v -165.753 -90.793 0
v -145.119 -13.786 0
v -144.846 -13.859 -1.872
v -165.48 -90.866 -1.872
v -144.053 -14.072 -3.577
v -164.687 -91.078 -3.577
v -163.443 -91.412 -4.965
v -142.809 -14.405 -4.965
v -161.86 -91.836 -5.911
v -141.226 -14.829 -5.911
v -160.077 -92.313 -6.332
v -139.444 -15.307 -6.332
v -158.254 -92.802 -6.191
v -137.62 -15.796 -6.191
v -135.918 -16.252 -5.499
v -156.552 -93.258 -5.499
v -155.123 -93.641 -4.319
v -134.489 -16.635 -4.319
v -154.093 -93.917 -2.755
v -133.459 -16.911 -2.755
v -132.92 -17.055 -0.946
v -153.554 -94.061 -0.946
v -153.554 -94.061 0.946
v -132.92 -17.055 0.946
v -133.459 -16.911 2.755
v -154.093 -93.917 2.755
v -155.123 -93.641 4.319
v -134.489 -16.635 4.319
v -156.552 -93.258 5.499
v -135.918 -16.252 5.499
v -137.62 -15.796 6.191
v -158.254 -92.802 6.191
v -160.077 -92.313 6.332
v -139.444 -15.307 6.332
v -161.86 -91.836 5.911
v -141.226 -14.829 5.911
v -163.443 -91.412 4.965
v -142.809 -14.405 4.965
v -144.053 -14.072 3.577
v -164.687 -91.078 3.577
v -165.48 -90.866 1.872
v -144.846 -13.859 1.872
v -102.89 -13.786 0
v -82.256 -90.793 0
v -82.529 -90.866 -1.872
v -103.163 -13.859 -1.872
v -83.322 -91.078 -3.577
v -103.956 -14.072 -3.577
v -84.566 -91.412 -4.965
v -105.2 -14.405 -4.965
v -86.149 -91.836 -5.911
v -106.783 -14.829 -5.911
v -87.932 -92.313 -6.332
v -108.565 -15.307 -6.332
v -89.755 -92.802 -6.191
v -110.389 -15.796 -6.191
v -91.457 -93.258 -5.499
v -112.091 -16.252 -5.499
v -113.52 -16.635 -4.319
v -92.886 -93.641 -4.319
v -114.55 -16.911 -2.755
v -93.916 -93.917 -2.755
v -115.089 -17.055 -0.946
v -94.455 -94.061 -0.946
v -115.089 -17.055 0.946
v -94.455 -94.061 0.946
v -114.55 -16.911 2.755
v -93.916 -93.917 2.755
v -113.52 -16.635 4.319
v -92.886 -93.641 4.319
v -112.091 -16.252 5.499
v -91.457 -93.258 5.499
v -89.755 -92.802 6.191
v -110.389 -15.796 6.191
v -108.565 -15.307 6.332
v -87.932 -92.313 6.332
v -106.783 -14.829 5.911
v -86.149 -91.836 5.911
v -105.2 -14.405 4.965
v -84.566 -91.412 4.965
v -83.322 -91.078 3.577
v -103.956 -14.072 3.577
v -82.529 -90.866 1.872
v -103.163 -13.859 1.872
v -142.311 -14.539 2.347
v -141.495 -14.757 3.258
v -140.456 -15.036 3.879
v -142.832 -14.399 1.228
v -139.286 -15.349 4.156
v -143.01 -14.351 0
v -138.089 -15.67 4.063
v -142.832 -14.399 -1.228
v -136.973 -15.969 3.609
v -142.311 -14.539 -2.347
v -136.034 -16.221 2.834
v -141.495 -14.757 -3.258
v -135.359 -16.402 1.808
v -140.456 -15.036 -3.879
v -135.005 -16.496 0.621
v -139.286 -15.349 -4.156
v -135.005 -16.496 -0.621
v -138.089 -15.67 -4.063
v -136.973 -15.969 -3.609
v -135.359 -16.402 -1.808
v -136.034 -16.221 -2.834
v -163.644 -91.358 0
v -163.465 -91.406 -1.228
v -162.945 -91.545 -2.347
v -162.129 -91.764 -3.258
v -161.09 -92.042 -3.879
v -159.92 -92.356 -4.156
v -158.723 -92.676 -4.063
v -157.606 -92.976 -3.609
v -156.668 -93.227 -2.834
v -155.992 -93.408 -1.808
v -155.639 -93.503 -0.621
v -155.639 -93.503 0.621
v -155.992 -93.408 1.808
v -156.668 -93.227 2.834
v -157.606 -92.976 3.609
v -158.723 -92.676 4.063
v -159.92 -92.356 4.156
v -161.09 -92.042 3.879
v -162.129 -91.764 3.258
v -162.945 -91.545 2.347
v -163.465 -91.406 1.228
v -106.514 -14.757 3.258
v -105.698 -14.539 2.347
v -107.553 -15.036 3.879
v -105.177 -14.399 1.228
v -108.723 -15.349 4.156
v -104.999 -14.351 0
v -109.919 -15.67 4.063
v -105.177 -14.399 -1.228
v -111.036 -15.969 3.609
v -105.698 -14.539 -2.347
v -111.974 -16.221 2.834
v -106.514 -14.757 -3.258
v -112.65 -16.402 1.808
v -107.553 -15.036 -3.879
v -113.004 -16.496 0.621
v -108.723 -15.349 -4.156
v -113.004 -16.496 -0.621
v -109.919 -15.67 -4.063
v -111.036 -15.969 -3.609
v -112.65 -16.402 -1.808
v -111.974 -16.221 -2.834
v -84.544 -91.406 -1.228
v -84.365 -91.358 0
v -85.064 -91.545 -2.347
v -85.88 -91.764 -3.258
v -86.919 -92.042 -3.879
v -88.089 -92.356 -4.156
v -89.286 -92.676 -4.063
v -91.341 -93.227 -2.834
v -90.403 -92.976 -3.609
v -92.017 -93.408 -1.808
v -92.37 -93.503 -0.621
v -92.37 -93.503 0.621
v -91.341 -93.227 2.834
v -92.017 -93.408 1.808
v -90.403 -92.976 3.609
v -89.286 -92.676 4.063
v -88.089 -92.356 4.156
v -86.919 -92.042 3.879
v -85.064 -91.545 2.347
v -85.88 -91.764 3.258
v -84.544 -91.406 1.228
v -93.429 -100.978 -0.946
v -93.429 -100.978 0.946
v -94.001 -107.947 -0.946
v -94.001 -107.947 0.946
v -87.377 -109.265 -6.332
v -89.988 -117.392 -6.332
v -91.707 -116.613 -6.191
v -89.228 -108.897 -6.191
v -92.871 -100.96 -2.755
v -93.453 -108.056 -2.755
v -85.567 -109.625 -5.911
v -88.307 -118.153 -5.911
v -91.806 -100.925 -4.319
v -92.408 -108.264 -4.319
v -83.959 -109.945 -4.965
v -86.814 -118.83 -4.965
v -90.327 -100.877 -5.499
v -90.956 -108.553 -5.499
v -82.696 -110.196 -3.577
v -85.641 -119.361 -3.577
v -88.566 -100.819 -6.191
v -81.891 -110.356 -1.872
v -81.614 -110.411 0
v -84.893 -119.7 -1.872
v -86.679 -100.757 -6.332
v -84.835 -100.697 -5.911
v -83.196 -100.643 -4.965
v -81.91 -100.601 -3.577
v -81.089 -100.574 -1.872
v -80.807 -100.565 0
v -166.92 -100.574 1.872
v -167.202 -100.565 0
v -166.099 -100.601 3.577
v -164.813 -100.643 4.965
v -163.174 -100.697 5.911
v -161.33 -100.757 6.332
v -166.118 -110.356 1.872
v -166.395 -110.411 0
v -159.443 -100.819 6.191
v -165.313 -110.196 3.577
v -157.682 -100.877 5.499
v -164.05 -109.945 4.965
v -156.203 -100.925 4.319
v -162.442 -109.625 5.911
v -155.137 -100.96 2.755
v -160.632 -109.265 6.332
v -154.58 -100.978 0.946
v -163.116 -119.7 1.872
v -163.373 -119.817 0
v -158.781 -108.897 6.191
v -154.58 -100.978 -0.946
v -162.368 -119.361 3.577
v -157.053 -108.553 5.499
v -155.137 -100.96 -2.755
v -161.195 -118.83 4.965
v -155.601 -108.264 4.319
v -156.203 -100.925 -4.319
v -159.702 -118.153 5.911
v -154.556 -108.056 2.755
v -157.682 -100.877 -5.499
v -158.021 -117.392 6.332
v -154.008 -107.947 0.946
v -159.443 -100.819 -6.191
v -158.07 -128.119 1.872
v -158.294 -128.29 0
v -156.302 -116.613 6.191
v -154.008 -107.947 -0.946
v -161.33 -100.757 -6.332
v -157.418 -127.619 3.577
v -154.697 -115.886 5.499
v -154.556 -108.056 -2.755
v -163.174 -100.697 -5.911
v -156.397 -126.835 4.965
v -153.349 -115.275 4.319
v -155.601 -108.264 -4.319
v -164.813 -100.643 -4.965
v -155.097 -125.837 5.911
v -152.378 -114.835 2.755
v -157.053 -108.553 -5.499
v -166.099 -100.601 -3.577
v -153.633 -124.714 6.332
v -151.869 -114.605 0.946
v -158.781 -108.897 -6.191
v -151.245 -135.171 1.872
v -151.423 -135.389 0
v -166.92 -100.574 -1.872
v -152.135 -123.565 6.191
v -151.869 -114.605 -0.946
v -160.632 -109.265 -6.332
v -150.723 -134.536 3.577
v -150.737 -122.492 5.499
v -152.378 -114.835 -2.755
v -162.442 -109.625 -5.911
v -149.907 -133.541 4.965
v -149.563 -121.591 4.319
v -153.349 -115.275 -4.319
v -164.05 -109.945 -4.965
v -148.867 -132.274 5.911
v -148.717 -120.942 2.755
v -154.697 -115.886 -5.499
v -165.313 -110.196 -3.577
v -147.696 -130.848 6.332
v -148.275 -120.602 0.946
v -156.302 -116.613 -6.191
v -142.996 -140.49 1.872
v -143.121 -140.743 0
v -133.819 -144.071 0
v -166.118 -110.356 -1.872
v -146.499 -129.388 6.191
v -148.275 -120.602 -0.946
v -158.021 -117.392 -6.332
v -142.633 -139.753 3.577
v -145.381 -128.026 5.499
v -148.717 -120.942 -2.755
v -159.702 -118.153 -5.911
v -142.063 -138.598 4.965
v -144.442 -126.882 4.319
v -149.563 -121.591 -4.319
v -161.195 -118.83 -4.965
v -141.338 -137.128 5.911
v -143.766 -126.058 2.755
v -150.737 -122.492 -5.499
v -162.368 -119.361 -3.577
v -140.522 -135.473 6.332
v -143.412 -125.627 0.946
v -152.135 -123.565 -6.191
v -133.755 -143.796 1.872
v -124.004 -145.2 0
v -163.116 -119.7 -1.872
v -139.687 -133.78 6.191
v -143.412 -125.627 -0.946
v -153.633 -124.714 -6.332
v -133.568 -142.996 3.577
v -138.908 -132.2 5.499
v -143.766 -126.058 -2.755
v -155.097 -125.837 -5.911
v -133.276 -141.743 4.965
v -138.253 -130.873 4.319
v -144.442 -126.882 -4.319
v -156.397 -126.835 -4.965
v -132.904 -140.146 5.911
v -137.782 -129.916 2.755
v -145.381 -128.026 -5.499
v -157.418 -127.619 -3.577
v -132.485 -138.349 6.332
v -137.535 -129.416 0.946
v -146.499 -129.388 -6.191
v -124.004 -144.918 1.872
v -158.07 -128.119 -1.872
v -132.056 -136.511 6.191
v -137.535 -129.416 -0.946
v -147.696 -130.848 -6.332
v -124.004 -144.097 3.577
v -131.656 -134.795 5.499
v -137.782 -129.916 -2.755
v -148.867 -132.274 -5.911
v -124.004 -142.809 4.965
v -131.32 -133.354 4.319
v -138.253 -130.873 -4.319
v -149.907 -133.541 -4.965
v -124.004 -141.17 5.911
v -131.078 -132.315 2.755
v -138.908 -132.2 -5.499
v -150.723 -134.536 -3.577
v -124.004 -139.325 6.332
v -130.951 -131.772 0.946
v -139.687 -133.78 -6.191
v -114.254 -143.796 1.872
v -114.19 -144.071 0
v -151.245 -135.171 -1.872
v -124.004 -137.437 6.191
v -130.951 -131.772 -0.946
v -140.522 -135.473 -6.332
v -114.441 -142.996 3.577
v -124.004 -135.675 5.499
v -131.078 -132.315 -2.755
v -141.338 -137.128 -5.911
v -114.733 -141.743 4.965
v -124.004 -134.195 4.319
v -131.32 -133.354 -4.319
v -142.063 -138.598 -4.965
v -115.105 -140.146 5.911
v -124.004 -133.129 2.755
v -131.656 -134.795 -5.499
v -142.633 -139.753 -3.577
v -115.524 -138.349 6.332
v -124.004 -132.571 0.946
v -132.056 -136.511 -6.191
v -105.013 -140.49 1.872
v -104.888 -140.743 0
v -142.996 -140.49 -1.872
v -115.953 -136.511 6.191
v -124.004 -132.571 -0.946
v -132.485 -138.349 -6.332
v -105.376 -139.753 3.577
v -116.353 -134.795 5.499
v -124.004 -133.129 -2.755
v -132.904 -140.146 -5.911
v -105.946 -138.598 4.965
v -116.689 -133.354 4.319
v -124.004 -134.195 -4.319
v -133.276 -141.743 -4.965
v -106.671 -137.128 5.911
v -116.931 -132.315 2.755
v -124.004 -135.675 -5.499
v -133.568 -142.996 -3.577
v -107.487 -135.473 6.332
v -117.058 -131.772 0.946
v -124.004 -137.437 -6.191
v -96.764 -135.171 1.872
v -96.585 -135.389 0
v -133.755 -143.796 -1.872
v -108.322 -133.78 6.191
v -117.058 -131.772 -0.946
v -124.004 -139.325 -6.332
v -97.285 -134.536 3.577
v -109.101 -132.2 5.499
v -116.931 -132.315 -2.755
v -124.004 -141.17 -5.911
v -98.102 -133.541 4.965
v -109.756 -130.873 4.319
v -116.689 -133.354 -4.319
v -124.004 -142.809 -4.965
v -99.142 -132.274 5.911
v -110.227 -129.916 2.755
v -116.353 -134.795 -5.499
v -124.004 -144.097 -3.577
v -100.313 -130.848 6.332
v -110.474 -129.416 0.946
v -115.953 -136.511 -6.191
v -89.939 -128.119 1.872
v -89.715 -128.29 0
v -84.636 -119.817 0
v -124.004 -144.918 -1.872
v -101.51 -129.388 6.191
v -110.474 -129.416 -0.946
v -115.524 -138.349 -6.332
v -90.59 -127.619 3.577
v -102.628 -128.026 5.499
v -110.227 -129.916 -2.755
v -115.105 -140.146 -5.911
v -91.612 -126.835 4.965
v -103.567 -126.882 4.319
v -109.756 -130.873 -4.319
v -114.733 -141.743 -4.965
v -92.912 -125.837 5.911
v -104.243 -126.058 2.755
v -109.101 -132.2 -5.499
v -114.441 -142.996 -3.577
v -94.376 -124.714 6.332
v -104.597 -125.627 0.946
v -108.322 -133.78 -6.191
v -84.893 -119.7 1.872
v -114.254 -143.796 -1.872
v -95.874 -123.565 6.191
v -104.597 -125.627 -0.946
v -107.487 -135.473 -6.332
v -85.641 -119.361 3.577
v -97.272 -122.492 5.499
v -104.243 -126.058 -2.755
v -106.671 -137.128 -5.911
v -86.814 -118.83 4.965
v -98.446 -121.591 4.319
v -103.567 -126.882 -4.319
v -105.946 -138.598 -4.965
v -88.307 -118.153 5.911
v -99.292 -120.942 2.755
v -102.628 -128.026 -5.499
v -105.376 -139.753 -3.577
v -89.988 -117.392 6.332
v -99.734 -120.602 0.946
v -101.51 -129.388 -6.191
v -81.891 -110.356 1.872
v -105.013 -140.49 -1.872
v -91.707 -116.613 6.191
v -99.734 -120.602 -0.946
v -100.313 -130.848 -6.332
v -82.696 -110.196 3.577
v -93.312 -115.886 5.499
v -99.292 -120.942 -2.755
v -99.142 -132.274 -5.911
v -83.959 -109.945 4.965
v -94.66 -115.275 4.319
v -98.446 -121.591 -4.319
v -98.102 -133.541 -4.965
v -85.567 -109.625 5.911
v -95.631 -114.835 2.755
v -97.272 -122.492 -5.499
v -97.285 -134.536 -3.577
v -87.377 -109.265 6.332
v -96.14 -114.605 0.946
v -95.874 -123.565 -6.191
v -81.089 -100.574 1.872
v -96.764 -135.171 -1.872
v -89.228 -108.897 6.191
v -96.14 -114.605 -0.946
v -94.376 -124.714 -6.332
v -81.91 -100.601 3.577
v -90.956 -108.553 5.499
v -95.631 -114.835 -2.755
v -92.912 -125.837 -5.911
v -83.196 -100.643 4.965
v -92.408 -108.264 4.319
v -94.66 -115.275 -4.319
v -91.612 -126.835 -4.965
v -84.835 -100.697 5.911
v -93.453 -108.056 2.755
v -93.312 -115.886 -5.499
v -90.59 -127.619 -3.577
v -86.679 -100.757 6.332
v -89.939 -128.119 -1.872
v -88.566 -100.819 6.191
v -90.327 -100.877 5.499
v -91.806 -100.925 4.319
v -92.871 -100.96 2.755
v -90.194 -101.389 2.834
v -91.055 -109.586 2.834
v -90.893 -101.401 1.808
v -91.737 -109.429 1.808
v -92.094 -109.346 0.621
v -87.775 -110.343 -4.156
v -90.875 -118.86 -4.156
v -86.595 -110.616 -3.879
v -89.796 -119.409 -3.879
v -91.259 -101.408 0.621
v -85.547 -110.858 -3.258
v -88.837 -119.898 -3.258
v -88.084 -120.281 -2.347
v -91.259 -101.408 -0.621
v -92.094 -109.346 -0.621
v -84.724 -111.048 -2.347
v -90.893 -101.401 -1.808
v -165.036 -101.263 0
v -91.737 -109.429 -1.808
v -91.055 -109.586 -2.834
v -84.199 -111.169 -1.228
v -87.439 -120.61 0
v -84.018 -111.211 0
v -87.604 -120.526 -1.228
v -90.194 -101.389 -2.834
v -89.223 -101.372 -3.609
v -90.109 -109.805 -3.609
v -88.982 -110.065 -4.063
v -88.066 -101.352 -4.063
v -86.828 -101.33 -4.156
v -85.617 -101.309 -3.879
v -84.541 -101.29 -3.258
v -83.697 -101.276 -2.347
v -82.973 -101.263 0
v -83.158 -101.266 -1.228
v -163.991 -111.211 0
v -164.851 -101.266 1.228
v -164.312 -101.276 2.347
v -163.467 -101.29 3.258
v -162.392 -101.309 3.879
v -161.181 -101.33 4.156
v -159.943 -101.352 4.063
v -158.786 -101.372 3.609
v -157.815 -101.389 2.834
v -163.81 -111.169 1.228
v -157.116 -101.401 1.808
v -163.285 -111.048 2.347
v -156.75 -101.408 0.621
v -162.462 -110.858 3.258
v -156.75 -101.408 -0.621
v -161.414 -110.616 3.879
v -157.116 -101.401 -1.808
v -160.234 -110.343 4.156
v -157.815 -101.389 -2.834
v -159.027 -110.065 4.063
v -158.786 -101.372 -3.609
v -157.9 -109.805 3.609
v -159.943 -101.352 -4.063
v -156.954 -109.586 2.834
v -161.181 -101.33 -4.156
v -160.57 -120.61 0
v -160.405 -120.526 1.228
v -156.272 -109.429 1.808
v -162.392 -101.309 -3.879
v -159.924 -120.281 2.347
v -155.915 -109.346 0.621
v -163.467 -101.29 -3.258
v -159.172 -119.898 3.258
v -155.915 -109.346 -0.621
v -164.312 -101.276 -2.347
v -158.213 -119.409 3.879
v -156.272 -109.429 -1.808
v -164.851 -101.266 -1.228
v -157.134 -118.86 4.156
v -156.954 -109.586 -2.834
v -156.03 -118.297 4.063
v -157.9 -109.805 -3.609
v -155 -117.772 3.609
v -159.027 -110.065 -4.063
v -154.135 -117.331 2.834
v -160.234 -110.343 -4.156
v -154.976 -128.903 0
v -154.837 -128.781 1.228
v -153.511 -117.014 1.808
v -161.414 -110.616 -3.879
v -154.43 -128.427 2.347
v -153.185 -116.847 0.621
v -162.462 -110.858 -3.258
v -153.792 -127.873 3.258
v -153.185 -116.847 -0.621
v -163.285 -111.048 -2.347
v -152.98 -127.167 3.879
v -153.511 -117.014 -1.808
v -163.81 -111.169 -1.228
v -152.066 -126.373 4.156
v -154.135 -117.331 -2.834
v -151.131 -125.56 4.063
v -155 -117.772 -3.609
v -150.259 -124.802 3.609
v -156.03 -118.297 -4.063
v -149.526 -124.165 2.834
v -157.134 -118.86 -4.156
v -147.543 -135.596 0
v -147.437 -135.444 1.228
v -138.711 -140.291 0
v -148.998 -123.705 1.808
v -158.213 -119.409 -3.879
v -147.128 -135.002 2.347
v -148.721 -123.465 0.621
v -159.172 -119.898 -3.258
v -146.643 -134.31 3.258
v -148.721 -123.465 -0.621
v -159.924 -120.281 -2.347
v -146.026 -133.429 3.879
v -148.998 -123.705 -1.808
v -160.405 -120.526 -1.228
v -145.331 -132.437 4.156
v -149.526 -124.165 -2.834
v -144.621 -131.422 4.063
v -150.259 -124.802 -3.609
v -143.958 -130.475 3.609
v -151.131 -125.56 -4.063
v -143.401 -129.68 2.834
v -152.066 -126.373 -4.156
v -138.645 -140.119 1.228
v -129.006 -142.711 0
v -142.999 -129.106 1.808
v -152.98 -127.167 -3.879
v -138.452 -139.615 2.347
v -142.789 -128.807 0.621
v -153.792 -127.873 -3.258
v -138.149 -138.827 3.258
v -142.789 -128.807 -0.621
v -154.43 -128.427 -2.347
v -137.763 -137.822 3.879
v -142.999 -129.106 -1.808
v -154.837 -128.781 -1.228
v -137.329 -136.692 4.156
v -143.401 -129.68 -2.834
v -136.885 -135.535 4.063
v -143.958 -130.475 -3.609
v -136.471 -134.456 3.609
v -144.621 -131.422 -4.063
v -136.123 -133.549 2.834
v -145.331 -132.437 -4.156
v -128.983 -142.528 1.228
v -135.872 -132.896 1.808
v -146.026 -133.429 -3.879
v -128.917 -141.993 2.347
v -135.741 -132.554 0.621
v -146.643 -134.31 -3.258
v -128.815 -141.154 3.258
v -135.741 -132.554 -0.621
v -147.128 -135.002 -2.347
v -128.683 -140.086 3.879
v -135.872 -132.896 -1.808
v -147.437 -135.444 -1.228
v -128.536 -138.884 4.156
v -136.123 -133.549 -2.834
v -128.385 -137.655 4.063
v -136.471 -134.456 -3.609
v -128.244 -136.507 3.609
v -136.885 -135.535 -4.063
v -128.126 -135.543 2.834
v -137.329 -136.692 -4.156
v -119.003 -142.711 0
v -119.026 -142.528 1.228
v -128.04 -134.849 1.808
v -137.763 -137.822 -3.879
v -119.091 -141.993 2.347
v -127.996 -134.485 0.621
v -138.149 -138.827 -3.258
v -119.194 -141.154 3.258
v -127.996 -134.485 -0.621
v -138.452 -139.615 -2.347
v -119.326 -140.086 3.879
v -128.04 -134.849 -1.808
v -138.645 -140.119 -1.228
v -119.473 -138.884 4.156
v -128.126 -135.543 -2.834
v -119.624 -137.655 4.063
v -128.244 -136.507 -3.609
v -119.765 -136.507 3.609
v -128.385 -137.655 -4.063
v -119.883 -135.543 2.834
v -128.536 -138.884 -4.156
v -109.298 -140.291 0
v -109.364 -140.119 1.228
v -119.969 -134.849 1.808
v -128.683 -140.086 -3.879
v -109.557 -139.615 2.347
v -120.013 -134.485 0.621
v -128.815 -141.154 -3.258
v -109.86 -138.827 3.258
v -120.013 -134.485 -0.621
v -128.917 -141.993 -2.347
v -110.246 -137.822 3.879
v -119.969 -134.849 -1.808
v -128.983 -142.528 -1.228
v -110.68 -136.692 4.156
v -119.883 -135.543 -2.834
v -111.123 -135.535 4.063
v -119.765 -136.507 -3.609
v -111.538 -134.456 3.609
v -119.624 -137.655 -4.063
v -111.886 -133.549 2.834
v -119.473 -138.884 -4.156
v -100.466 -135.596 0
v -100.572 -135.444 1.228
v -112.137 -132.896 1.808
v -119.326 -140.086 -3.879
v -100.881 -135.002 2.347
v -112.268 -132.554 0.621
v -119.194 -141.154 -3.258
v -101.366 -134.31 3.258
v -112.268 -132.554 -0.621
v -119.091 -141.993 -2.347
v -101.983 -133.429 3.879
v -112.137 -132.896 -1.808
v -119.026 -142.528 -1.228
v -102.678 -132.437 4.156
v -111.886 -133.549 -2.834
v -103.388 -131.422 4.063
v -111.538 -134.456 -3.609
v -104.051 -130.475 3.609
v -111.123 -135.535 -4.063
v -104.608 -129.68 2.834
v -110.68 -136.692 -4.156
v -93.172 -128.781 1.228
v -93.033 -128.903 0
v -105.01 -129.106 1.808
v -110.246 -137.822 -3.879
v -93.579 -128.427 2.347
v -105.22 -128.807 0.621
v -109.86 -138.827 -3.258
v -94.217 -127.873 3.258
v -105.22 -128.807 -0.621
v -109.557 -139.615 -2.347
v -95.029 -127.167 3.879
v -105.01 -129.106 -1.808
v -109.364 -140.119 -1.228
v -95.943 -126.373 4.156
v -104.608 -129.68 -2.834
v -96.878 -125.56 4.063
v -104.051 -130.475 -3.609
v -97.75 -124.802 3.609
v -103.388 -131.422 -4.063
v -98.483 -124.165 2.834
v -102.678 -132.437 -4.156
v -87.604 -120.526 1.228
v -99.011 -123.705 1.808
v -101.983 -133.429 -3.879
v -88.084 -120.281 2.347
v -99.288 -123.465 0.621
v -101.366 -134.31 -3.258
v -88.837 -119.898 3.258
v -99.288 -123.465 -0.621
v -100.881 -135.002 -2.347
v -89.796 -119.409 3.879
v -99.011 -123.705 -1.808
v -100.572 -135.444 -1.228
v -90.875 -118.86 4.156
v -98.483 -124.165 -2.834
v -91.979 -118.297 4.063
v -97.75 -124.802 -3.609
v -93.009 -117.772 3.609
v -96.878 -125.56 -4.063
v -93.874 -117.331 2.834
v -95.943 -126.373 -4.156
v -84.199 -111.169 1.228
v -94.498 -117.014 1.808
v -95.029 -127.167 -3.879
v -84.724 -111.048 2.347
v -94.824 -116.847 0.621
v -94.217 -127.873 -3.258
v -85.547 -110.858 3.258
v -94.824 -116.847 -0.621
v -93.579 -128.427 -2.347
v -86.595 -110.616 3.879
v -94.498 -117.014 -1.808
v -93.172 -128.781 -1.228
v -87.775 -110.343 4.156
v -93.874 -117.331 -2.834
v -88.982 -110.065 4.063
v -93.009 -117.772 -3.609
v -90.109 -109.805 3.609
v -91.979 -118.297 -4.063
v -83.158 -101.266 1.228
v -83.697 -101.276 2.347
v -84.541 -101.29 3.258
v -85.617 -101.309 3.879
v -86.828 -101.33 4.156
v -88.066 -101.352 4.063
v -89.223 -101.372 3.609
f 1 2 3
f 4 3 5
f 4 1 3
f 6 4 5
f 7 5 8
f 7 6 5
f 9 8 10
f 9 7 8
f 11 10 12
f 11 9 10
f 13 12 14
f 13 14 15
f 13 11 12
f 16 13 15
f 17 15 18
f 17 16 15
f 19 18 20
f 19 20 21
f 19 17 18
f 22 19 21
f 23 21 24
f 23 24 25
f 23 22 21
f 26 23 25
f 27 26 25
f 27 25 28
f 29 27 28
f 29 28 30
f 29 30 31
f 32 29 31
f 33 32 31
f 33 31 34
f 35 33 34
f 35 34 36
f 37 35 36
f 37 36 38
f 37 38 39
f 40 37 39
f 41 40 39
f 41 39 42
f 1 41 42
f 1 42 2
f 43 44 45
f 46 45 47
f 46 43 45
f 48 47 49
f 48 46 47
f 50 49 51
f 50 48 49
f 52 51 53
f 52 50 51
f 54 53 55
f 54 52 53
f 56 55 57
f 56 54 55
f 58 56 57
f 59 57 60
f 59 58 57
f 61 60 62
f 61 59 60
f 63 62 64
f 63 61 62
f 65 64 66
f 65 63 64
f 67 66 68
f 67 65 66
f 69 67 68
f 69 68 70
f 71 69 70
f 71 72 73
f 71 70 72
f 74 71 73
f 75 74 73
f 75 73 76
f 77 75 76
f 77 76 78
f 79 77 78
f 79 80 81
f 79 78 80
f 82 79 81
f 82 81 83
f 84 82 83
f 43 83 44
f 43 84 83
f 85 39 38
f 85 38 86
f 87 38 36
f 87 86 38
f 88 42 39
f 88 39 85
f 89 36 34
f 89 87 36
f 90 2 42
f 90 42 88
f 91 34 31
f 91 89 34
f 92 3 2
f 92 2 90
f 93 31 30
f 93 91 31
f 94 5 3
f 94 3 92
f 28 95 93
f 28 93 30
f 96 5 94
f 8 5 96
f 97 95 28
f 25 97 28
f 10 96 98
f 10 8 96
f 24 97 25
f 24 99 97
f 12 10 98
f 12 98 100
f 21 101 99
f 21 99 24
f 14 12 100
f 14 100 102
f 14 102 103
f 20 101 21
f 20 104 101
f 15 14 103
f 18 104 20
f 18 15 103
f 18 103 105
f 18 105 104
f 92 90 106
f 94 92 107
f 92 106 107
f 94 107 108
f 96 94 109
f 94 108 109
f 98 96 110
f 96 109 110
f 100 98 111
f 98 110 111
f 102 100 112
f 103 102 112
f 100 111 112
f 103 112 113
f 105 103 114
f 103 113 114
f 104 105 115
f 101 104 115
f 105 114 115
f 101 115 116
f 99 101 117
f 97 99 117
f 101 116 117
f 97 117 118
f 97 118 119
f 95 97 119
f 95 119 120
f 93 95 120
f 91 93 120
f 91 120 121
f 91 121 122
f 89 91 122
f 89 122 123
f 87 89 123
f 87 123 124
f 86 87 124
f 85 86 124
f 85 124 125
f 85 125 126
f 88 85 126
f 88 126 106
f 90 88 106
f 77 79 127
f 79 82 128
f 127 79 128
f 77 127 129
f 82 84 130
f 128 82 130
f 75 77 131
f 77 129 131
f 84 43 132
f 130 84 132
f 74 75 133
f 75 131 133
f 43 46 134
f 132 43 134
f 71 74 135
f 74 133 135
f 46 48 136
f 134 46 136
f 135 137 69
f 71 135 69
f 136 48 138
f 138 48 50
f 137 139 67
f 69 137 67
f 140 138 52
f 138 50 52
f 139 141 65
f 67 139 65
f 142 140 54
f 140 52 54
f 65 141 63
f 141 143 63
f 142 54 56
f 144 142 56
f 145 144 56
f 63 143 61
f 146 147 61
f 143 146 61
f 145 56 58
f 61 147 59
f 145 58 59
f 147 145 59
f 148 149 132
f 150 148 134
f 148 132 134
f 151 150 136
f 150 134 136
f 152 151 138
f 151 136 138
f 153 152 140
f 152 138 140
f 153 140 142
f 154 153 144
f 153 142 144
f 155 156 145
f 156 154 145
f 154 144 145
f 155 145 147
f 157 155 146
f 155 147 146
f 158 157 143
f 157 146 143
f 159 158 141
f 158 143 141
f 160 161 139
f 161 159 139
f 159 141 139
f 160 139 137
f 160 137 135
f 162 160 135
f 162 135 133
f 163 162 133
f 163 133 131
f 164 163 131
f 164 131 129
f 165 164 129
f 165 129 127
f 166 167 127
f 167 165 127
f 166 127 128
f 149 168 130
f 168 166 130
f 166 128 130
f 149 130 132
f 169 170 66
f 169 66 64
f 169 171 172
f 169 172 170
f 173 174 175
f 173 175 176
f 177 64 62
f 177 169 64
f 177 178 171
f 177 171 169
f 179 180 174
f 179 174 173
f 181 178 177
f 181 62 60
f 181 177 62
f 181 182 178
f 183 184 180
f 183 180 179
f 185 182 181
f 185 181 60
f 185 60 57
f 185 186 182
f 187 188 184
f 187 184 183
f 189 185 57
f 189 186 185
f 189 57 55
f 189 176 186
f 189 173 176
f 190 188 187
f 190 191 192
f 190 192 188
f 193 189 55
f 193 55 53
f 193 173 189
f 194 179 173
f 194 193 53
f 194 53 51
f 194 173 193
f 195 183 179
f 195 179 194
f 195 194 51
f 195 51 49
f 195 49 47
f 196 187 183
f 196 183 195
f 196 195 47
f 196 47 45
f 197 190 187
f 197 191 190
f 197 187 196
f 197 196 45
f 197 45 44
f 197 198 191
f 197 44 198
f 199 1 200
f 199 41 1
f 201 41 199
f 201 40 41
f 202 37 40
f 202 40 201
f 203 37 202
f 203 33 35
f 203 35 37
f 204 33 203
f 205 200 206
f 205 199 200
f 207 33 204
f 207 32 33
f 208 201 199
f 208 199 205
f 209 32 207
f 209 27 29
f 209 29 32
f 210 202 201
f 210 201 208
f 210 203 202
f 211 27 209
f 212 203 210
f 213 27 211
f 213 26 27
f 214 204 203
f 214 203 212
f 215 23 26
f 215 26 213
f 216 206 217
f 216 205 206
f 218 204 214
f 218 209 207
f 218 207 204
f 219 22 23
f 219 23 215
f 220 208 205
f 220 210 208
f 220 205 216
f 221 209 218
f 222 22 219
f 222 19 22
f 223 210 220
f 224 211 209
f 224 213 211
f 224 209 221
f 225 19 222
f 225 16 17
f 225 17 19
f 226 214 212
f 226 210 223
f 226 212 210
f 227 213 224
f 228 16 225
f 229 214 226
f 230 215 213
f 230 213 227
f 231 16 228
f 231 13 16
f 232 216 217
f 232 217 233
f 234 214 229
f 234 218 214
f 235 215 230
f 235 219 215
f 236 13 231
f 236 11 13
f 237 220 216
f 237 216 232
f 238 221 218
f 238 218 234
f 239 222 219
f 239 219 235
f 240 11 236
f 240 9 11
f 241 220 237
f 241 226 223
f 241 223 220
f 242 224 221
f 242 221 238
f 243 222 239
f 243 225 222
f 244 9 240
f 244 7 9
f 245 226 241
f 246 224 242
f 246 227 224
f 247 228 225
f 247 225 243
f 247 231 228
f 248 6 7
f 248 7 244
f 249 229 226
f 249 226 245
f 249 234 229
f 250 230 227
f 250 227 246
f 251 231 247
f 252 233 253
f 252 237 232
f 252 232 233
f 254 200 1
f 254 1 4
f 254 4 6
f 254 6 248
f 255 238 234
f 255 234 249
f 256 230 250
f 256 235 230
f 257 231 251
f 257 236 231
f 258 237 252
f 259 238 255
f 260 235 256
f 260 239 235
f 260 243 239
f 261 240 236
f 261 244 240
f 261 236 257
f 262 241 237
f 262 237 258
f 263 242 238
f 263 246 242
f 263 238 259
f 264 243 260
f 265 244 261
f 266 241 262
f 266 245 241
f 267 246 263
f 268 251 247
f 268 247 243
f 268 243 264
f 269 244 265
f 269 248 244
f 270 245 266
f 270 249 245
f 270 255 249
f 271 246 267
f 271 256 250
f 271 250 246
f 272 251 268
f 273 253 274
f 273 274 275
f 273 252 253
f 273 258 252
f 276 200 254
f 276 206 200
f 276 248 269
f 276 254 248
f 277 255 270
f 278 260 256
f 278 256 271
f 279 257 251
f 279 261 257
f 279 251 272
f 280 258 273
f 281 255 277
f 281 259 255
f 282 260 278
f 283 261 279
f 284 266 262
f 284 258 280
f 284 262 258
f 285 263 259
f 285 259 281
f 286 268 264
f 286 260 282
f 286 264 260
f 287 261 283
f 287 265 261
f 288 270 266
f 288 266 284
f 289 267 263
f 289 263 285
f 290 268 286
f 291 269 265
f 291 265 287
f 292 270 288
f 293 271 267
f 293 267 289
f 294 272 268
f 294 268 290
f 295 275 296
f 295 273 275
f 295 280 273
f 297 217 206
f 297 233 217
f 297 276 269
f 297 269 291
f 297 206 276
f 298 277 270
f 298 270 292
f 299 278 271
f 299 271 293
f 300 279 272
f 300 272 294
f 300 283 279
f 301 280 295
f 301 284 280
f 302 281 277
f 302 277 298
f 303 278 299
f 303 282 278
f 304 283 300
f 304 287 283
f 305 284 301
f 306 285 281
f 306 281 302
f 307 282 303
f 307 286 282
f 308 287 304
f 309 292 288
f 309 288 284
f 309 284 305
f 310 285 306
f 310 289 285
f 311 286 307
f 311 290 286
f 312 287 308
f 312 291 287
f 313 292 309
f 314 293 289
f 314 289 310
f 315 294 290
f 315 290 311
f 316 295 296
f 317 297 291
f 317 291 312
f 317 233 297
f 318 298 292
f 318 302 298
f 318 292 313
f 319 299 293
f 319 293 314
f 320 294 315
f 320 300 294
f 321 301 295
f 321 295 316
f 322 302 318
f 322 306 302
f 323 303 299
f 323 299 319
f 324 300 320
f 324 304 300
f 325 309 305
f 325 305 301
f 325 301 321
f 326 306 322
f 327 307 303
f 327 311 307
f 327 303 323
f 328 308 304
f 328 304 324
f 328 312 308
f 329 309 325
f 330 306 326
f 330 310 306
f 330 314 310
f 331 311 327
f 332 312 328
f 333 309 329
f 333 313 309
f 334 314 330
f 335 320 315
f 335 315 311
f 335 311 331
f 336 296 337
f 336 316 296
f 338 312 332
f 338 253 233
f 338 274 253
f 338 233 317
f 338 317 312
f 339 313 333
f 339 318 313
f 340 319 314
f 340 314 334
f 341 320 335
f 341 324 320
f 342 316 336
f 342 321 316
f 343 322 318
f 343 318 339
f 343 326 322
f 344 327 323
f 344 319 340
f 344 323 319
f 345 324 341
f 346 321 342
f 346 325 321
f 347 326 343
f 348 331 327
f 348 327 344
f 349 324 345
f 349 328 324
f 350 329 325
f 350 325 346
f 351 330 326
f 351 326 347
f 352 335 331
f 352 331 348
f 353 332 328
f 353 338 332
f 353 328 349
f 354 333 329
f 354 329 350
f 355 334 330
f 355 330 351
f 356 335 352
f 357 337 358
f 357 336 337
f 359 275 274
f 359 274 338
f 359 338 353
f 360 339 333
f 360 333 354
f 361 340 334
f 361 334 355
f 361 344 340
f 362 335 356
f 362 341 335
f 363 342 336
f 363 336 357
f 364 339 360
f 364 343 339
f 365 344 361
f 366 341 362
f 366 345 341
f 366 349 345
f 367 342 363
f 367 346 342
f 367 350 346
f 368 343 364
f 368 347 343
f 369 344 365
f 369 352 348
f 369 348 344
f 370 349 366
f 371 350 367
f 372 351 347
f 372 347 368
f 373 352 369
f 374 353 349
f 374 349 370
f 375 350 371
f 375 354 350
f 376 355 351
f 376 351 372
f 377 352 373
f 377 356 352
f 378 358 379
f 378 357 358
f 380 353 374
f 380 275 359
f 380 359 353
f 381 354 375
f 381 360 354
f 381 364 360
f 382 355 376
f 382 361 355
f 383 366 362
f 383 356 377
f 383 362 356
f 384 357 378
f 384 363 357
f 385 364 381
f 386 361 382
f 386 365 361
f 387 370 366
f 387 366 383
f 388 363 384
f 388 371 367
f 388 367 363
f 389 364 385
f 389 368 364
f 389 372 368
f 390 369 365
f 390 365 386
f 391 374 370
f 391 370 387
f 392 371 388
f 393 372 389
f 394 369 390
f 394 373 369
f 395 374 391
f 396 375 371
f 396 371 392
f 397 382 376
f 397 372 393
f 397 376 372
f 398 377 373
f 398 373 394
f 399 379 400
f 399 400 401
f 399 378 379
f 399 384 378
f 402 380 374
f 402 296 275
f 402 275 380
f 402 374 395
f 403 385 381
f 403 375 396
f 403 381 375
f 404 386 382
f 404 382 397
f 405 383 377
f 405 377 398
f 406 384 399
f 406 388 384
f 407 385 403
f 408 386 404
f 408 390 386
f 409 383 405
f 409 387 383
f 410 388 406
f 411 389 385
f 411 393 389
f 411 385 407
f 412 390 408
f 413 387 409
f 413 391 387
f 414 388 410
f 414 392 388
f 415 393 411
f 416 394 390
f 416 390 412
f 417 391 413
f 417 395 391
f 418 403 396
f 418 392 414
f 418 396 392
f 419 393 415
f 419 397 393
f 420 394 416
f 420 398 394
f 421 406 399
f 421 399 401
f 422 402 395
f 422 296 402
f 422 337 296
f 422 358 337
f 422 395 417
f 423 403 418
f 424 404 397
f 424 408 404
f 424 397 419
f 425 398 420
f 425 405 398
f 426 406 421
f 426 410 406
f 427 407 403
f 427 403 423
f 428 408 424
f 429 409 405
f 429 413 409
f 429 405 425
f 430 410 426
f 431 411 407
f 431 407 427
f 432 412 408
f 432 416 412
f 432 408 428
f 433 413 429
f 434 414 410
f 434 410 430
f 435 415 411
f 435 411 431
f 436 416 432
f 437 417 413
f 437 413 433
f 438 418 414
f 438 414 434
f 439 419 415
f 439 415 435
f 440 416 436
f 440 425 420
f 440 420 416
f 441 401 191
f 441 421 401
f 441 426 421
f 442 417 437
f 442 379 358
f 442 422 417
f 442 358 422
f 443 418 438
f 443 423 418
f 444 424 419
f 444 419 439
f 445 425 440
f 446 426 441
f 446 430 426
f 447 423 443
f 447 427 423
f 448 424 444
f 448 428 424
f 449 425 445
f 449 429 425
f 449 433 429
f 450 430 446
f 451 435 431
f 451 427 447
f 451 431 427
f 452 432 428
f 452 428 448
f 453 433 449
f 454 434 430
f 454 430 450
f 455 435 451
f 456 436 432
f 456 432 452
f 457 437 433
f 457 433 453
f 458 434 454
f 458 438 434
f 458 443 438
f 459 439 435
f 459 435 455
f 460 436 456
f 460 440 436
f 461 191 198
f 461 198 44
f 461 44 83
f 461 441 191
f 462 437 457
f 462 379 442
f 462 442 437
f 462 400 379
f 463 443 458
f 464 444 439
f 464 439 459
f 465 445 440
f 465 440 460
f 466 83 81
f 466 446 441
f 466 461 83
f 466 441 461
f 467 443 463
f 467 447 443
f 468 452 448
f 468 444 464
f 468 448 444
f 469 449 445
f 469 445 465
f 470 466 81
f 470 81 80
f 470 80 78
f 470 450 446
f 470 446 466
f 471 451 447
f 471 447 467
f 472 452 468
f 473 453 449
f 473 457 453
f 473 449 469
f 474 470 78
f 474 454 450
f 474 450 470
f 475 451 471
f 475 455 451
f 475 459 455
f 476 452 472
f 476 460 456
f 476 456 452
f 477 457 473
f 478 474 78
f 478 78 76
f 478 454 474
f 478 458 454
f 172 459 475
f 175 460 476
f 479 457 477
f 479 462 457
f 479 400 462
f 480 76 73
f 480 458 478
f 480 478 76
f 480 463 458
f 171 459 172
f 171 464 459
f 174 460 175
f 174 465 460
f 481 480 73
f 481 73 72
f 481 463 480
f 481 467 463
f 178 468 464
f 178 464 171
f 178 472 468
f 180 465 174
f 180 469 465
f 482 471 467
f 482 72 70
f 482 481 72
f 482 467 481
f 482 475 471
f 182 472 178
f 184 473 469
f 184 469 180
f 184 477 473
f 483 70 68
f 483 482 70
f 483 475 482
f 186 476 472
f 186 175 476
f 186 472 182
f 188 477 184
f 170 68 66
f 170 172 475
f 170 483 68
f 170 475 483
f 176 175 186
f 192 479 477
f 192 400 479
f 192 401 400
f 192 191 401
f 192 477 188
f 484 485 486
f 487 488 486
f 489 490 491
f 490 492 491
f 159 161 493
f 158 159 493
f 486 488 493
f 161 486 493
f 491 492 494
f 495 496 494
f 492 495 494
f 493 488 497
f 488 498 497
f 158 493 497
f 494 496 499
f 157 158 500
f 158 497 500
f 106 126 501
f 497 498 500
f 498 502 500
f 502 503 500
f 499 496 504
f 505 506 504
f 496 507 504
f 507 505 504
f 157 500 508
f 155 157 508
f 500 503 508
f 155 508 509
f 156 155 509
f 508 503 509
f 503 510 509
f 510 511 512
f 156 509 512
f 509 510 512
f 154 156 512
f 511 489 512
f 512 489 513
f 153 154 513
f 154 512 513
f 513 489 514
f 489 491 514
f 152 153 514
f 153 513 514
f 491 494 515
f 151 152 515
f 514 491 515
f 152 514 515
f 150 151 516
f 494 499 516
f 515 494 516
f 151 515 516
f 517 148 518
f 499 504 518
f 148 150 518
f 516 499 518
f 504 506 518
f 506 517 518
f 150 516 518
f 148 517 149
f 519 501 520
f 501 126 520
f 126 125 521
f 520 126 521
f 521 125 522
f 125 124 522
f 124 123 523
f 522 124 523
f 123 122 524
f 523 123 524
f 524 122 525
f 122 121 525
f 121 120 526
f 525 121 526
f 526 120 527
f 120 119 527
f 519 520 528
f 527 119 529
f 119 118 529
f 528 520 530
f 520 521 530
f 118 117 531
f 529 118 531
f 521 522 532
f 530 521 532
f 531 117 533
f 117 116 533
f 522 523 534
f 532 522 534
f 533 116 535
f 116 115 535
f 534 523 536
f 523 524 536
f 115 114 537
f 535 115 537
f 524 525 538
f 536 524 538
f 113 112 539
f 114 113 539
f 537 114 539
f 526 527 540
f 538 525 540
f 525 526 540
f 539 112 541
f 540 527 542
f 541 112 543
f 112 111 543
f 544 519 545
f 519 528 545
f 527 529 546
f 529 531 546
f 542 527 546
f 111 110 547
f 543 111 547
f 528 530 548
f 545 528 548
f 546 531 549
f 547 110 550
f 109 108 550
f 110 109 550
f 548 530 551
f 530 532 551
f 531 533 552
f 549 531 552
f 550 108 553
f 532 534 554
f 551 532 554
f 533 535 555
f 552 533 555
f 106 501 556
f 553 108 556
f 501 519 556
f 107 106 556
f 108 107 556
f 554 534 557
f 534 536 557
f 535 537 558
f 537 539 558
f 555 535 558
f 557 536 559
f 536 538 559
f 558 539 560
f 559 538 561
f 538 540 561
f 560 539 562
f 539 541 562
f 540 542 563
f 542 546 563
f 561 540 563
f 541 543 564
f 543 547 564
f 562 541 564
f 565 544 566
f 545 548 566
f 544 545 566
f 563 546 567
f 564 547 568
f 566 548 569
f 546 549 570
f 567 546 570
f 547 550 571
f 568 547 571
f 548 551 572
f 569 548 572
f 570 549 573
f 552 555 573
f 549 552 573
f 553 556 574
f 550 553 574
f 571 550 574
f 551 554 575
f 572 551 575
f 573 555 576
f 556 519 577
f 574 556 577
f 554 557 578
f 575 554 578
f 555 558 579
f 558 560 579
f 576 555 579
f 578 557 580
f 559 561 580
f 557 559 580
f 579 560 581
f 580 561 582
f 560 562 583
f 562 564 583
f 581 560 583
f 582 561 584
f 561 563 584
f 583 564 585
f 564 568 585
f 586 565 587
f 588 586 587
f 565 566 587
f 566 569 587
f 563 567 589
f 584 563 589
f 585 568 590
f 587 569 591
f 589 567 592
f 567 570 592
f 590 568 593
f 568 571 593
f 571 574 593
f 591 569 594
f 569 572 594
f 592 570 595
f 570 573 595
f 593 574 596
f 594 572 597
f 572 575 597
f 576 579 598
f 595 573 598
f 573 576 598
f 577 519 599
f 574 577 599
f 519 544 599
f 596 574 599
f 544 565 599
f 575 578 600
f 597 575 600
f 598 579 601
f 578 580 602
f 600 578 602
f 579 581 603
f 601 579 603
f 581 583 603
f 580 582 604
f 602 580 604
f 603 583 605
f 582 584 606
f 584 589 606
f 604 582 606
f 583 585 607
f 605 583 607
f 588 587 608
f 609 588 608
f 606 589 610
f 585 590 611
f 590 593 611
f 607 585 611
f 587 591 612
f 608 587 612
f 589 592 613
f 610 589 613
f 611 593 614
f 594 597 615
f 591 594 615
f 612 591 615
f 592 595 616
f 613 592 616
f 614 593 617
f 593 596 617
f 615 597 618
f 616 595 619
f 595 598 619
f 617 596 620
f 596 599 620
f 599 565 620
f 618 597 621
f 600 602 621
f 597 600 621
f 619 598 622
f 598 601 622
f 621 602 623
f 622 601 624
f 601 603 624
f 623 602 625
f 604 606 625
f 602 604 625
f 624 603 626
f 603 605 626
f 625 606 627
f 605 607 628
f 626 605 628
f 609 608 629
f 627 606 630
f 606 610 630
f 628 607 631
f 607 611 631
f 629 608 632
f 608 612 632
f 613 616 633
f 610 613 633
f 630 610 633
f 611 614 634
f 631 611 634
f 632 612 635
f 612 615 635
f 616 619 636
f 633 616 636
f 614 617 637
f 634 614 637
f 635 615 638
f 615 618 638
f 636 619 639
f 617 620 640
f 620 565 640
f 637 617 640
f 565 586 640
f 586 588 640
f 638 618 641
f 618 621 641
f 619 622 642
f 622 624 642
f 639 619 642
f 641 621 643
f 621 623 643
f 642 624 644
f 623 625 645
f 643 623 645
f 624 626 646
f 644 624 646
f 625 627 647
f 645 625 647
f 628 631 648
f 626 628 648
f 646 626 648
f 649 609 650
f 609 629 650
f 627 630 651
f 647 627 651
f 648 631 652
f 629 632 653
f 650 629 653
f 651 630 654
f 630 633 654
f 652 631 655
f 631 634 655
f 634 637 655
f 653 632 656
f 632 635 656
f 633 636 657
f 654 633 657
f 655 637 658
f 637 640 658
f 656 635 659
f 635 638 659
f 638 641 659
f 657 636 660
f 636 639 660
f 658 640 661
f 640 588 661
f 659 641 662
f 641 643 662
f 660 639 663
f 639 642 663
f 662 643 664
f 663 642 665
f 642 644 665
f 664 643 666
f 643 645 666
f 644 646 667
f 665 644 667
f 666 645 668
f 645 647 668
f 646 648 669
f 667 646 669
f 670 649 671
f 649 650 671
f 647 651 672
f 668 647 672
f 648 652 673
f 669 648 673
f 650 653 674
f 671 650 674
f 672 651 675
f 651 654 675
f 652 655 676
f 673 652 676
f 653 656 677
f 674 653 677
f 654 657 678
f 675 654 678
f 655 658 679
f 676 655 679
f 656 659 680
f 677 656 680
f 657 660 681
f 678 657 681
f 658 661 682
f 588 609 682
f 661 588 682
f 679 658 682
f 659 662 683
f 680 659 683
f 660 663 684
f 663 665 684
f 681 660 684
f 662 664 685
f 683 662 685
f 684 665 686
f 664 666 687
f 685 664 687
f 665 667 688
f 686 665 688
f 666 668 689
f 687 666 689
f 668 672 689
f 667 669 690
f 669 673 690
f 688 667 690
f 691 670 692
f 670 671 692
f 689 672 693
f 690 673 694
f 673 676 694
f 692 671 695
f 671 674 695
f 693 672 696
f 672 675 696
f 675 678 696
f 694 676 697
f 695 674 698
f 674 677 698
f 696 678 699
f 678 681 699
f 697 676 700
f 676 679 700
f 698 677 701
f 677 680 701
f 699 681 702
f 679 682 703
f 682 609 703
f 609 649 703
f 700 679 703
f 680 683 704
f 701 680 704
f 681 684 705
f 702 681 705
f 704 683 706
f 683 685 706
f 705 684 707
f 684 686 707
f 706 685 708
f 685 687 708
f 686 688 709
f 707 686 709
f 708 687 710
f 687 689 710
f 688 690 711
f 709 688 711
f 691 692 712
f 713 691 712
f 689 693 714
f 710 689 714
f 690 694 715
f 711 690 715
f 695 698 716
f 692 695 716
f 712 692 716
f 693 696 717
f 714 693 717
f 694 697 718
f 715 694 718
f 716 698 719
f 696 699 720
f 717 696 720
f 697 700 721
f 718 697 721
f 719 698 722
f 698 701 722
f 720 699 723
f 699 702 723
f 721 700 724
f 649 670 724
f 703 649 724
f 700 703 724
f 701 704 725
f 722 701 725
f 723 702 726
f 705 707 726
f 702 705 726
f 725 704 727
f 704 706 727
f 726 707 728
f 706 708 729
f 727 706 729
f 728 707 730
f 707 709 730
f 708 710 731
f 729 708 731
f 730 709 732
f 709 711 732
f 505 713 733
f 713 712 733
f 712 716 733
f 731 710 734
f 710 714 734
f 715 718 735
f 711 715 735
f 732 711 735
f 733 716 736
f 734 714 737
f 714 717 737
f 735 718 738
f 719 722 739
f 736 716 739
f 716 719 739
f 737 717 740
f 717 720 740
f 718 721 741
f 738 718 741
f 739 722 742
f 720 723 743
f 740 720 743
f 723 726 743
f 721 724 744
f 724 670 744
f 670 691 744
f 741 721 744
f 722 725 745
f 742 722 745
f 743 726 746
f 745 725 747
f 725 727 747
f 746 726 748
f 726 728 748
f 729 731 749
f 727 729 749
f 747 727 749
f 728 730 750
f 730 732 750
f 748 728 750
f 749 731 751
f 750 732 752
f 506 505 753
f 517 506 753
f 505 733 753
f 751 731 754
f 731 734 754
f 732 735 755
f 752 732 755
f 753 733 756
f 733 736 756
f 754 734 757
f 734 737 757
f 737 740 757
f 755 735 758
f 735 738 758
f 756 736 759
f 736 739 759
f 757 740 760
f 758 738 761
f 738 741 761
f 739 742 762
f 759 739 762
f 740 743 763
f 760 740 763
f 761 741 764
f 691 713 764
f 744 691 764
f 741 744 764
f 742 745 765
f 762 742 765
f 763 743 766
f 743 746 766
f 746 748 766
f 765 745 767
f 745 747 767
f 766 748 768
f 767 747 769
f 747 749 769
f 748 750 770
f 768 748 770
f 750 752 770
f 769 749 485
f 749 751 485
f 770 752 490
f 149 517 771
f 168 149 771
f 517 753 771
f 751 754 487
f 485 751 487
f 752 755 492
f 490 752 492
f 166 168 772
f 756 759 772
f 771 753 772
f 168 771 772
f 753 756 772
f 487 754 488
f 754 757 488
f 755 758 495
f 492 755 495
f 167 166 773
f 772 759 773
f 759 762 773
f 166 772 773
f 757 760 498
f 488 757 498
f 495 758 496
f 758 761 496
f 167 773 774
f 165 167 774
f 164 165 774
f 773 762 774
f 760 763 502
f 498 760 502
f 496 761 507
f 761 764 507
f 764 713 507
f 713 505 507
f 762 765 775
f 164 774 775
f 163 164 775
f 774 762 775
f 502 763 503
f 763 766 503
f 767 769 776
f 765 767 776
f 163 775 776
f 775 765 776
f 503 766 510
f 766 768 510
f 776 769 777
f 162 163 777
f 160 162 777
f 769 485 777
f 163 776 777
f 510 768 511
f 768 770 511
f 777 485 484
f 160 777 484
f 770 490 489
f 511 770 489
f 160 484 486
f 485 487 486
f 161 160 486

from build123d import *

# Parameters (mm, degrees)
SKETCH2_R   = 6.35
SKETCH2_R_2 = 4.1671875


with BuildPart() as part:
    # Sweep1: sweep along a path in Sketch1
    with BuildLine(Plane.XY) as sweep1_path:
        Line((-138.985158779, -15.429917513), (-159.618955177, -92.436294023))
        ThreePointArc((-159.618955177, -92.436294023), (-124.004465969, -138.85), (-88.389976761, -92.436294023))
        Line((-88.389976761, -92.436294023), (-109.023773159, -15.429917513))
    # Sketch2 → Sweep1 (sweep)
    with BuildSketch(Plane(origin=(-3.445728615, 12.859634261, 0), x_dir=(0.965925826, 0.258819045, 0), z_dir=(0.258819045, -0.965925826, 0))):
        with Locations((-109.302434691, 0)):
            Circle(SKETCH2_R)
        with Locations((-109.302434691, 0)):
            Circle(SKETCH2_R_2, mode=Mode.SUBTRACT)
    sweep(path=sweep1_path.line)


solid = part.part
